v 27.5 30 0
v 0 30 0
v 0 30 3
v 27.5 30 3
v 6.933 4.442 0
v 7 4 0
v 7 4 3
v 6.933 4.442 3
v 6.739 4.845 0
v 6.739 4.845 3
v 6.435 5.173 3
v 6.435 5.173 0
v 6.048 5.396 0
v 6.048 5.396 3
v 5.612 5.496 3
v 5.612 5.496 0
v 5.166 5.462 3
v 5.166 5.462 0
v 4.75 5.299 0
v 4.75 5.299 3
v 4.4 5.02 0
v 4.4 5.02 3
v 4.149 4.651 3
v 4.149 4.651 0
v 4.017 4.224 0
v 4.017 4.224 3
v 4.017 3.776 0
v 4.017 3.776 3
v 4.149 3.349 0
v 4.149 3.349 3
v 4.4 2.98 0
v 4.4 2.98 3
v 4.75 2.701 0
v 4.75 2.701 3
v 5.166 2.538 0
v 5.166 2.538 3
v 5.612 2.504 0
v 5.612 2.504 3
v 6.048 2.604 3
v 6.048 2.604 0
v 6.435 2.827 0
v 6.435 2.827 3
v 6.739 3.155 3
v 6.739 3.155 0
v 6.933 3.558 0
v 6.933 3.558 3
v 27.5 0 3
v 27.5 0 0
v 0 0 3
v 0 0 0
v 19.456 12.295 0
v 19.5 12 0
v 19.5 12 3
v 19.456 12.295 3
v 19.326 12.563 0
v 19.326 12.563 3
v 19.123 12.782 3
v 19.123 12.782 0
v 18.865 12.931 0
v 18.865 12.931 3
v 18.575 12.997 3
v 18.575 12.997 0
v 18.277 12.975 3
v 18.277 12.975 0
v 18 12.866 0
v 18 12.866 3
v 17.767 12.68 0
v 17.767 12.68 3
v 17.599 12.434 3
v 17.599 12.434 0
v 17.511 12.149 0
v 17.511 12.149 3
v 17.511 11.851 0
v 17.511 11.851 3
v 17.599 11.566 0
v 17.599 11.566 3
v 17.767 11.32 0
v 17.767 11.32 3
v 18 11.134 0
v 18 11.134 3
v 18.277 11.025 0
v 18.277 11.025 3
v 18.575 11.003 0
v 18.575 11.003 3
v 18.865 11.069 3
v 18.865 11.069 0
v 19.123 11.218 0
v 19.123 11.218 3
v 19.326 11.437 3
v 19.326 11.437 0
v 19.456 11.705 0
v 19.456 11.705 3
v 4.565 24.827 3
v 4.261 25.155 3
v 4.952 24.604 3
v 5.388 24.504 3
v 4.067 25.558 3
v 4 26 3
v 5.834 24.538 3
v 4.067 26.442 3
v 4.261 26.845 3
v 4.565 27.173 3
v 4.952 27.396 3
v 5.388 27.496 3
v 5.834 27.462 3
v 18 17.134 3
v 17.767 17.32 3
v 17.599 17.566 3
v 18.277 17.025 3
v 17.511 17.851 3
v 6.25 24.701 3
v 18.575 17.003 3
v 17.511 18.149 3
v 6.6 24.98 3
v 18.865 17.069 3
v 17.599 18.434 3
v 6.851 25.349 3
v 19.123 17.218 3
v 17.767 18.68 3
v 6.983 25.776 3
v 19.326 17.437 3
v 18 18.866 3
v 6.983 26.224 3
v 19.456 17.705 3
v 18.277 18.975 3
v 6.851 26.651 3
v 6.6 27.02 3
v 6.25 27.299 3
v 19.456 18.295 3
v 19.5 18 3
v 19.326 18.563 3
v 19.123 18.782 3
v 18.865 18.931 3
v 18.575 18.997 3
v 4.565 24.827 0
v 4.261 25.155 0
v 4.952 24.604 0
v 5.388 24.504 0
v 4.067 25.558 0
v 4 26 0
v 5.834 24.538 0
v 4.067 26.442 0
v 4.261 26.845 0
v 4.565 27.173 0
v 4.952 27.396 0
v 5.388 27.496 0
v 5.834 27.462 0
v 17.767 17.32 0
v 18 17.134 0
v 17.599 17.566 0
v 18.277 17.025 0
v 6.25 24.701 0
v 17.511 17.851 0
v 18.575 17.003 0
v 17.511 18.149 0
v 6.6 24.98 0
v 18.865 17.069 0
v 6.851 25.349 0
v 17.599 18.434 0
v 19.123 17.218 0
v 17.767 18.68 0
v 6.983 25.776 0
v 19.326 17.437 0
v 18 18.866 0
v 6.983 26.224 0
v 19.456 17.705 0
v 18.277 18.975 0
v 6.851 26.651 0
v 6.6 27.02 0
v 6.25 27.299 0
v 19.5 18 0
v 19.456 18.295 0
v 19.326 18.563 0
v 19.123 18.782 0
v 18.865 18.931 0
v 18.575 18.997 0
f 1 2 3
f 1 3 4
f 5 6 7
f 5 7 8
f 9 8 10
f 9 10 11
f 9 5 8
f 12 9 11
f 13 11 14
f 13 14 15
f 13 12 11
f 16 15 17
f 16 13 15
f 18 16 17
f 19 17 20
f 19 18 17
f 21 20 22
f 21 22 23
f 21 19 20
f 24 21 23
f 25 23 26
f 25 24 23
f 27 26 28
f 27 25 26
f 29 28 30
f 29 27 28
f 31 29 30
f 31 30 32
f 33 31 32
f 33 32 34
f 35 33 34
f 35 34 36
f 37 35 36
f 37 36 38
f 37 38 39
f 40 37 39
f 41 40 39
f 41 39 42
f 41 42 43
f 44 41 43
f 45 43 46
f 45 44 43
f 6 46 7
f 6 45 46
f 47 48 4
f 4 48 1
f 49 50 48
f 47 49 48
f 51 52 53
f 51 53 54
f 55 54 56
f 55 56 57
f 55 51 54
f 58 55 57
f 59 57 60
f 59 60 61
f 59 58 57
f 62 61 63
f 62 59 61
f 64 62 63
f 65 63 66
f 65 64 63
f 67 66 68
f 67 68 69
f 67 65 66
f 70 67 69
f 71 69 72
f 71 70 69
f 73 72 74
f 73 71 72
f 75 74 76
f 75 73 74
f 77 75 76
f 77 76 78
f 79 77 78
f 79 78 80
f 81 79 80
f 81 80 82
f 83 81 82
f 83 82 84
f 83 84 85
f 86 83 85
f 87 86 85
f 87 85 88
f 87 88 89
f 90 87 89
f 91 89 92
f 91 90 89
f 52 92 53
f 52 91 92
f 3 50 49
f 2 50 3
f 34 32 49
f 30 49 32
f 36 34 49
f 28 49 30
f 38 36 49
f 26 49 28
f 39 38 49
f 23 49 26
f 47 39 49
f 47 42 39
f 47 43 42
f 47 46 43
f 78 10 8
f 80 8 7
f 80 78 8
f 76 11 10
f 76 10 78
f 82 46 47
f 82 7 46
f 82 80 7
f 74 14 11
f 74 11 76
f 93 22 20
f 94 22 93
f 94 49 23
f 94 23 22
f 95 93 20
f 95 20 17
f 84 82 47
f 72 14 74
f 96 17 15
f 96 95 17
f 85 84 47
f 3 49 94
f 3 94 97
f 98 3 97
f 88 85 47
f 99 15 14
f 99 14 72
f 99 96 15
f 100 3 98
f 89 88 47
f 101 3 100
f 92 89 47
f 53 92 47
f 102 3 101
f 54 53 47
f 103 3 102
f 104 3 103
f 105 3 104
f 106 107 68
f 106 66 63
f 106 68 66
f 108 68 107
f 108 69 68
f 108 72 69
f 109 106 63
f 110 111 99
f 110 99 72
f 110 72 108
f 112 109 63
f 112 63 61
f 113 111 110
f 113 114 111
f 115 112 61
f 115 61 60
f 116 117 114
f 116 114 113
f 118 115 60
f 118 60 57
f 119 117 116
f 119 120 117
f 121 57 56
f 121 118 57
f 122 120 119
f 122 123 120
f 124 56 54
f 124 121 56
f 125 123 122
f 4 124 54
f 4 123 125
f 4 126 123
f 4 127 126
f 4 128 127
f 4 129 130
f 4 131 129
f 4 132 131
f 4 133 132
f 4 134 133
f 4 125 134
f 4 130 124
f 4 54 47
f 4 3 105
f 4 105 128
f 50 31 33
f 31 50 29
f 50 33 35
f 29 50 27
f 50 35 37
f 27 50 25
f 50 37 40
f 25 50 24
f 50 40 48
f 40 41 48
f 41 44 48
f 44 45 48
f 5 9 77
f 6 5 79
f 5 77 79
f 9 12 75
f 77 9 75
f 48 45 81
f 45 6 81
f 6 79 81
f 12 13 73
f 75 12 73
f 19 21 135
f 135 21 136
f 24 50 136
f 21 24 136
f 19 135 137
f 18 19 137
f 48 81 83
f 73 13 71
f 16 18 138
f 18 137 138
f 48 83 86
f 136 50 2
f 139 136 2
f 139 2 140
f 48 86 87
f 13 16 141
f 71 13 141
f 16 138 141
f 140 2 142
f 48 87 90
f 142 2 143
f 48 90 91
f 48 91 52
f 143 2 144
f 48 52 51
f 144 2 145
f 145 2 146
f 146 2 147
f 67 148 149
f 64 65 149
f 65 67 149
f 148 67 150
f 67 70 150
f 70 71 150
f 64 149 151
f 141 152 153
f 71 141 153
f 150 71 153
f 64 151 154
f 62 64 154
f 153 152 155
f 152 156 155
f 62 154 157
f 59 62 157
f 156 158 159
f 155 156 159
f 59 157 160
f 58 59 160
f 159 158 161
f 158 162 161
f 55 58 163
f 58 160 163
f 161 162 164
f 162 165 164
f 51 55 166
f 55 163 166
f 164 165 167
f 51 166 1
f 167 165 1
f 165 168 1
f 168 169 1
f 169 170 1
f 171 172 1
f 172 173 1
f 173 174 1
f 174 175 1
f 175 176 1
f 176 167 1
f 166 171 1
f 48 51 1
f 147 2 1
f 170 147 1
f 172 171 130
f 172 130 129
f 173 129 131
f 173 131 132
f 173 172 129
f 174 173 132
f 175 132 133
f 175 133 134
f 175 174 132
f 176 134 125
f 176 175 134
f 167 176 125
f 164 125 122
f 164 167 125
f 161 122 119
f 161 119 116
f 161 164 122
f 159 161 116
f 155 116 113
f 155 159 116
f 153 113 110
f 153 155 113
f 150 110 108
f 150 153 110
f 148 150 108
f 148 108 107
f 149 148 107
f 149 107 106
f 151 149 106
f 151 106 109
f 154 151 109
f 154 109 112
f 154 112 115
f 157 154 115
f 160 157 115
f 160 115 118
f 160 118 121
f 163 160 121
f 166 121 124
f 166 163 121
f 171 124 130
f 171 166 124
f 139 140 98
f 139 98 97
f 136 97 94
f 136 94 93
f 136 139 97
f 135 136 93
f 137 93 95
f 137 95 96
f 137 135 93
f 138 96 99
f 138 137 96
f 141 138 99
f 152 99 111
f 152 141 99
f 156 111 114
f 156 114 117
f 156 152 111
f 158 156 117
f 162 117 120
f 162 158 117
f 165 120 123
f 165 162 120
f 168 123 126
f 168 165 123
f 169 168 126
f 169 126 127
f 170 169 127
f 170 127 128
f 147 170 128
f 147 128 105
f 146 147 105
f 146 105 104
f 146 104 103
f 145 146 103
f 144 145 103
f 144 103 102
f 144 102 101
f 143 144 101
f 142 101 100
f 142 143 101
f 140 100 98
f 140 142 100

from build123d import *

# Parameters (mm, degrees)
CROQUIS1_W              = 27.5
CROQUIS1_H              = 30
CROQUIS1_R              = 1
CROQUIS1_R_2            = 1.5
SALIENTE_EXTRUIR1_DEPTH = 3


with BuildPart() as part:
    # Croquis1 → Saliente-Extruir1 (new body)
    with BuildSketch(Plane.XY):
        with Locations((13.75, 15)):
            Rectangle(CROQUIS1_W, CROQUIS1_H)
        with Locations((18.5, 12)):
            Circle(CROQUIS1_R, mode=Mode.SUBTRACT)
        with Locations((18.5, 18)):
            Circle(CROQUIS1_R, mode=Mode.SUBTRACT)
        with Locations((5.5, 4)):
            Circle(CROQUIS1_R_2, mode=Mode.SUBTRACT)
        with Locations(Location((5.5, 26, 0), (0, 0, 180))):
            Circle(CROQUIS1_R_2, mode=Mode.SUBTRACT)
    extrude(amount=SALIENTE_EXTRUIR1_DEPTH)


solid = part.part
